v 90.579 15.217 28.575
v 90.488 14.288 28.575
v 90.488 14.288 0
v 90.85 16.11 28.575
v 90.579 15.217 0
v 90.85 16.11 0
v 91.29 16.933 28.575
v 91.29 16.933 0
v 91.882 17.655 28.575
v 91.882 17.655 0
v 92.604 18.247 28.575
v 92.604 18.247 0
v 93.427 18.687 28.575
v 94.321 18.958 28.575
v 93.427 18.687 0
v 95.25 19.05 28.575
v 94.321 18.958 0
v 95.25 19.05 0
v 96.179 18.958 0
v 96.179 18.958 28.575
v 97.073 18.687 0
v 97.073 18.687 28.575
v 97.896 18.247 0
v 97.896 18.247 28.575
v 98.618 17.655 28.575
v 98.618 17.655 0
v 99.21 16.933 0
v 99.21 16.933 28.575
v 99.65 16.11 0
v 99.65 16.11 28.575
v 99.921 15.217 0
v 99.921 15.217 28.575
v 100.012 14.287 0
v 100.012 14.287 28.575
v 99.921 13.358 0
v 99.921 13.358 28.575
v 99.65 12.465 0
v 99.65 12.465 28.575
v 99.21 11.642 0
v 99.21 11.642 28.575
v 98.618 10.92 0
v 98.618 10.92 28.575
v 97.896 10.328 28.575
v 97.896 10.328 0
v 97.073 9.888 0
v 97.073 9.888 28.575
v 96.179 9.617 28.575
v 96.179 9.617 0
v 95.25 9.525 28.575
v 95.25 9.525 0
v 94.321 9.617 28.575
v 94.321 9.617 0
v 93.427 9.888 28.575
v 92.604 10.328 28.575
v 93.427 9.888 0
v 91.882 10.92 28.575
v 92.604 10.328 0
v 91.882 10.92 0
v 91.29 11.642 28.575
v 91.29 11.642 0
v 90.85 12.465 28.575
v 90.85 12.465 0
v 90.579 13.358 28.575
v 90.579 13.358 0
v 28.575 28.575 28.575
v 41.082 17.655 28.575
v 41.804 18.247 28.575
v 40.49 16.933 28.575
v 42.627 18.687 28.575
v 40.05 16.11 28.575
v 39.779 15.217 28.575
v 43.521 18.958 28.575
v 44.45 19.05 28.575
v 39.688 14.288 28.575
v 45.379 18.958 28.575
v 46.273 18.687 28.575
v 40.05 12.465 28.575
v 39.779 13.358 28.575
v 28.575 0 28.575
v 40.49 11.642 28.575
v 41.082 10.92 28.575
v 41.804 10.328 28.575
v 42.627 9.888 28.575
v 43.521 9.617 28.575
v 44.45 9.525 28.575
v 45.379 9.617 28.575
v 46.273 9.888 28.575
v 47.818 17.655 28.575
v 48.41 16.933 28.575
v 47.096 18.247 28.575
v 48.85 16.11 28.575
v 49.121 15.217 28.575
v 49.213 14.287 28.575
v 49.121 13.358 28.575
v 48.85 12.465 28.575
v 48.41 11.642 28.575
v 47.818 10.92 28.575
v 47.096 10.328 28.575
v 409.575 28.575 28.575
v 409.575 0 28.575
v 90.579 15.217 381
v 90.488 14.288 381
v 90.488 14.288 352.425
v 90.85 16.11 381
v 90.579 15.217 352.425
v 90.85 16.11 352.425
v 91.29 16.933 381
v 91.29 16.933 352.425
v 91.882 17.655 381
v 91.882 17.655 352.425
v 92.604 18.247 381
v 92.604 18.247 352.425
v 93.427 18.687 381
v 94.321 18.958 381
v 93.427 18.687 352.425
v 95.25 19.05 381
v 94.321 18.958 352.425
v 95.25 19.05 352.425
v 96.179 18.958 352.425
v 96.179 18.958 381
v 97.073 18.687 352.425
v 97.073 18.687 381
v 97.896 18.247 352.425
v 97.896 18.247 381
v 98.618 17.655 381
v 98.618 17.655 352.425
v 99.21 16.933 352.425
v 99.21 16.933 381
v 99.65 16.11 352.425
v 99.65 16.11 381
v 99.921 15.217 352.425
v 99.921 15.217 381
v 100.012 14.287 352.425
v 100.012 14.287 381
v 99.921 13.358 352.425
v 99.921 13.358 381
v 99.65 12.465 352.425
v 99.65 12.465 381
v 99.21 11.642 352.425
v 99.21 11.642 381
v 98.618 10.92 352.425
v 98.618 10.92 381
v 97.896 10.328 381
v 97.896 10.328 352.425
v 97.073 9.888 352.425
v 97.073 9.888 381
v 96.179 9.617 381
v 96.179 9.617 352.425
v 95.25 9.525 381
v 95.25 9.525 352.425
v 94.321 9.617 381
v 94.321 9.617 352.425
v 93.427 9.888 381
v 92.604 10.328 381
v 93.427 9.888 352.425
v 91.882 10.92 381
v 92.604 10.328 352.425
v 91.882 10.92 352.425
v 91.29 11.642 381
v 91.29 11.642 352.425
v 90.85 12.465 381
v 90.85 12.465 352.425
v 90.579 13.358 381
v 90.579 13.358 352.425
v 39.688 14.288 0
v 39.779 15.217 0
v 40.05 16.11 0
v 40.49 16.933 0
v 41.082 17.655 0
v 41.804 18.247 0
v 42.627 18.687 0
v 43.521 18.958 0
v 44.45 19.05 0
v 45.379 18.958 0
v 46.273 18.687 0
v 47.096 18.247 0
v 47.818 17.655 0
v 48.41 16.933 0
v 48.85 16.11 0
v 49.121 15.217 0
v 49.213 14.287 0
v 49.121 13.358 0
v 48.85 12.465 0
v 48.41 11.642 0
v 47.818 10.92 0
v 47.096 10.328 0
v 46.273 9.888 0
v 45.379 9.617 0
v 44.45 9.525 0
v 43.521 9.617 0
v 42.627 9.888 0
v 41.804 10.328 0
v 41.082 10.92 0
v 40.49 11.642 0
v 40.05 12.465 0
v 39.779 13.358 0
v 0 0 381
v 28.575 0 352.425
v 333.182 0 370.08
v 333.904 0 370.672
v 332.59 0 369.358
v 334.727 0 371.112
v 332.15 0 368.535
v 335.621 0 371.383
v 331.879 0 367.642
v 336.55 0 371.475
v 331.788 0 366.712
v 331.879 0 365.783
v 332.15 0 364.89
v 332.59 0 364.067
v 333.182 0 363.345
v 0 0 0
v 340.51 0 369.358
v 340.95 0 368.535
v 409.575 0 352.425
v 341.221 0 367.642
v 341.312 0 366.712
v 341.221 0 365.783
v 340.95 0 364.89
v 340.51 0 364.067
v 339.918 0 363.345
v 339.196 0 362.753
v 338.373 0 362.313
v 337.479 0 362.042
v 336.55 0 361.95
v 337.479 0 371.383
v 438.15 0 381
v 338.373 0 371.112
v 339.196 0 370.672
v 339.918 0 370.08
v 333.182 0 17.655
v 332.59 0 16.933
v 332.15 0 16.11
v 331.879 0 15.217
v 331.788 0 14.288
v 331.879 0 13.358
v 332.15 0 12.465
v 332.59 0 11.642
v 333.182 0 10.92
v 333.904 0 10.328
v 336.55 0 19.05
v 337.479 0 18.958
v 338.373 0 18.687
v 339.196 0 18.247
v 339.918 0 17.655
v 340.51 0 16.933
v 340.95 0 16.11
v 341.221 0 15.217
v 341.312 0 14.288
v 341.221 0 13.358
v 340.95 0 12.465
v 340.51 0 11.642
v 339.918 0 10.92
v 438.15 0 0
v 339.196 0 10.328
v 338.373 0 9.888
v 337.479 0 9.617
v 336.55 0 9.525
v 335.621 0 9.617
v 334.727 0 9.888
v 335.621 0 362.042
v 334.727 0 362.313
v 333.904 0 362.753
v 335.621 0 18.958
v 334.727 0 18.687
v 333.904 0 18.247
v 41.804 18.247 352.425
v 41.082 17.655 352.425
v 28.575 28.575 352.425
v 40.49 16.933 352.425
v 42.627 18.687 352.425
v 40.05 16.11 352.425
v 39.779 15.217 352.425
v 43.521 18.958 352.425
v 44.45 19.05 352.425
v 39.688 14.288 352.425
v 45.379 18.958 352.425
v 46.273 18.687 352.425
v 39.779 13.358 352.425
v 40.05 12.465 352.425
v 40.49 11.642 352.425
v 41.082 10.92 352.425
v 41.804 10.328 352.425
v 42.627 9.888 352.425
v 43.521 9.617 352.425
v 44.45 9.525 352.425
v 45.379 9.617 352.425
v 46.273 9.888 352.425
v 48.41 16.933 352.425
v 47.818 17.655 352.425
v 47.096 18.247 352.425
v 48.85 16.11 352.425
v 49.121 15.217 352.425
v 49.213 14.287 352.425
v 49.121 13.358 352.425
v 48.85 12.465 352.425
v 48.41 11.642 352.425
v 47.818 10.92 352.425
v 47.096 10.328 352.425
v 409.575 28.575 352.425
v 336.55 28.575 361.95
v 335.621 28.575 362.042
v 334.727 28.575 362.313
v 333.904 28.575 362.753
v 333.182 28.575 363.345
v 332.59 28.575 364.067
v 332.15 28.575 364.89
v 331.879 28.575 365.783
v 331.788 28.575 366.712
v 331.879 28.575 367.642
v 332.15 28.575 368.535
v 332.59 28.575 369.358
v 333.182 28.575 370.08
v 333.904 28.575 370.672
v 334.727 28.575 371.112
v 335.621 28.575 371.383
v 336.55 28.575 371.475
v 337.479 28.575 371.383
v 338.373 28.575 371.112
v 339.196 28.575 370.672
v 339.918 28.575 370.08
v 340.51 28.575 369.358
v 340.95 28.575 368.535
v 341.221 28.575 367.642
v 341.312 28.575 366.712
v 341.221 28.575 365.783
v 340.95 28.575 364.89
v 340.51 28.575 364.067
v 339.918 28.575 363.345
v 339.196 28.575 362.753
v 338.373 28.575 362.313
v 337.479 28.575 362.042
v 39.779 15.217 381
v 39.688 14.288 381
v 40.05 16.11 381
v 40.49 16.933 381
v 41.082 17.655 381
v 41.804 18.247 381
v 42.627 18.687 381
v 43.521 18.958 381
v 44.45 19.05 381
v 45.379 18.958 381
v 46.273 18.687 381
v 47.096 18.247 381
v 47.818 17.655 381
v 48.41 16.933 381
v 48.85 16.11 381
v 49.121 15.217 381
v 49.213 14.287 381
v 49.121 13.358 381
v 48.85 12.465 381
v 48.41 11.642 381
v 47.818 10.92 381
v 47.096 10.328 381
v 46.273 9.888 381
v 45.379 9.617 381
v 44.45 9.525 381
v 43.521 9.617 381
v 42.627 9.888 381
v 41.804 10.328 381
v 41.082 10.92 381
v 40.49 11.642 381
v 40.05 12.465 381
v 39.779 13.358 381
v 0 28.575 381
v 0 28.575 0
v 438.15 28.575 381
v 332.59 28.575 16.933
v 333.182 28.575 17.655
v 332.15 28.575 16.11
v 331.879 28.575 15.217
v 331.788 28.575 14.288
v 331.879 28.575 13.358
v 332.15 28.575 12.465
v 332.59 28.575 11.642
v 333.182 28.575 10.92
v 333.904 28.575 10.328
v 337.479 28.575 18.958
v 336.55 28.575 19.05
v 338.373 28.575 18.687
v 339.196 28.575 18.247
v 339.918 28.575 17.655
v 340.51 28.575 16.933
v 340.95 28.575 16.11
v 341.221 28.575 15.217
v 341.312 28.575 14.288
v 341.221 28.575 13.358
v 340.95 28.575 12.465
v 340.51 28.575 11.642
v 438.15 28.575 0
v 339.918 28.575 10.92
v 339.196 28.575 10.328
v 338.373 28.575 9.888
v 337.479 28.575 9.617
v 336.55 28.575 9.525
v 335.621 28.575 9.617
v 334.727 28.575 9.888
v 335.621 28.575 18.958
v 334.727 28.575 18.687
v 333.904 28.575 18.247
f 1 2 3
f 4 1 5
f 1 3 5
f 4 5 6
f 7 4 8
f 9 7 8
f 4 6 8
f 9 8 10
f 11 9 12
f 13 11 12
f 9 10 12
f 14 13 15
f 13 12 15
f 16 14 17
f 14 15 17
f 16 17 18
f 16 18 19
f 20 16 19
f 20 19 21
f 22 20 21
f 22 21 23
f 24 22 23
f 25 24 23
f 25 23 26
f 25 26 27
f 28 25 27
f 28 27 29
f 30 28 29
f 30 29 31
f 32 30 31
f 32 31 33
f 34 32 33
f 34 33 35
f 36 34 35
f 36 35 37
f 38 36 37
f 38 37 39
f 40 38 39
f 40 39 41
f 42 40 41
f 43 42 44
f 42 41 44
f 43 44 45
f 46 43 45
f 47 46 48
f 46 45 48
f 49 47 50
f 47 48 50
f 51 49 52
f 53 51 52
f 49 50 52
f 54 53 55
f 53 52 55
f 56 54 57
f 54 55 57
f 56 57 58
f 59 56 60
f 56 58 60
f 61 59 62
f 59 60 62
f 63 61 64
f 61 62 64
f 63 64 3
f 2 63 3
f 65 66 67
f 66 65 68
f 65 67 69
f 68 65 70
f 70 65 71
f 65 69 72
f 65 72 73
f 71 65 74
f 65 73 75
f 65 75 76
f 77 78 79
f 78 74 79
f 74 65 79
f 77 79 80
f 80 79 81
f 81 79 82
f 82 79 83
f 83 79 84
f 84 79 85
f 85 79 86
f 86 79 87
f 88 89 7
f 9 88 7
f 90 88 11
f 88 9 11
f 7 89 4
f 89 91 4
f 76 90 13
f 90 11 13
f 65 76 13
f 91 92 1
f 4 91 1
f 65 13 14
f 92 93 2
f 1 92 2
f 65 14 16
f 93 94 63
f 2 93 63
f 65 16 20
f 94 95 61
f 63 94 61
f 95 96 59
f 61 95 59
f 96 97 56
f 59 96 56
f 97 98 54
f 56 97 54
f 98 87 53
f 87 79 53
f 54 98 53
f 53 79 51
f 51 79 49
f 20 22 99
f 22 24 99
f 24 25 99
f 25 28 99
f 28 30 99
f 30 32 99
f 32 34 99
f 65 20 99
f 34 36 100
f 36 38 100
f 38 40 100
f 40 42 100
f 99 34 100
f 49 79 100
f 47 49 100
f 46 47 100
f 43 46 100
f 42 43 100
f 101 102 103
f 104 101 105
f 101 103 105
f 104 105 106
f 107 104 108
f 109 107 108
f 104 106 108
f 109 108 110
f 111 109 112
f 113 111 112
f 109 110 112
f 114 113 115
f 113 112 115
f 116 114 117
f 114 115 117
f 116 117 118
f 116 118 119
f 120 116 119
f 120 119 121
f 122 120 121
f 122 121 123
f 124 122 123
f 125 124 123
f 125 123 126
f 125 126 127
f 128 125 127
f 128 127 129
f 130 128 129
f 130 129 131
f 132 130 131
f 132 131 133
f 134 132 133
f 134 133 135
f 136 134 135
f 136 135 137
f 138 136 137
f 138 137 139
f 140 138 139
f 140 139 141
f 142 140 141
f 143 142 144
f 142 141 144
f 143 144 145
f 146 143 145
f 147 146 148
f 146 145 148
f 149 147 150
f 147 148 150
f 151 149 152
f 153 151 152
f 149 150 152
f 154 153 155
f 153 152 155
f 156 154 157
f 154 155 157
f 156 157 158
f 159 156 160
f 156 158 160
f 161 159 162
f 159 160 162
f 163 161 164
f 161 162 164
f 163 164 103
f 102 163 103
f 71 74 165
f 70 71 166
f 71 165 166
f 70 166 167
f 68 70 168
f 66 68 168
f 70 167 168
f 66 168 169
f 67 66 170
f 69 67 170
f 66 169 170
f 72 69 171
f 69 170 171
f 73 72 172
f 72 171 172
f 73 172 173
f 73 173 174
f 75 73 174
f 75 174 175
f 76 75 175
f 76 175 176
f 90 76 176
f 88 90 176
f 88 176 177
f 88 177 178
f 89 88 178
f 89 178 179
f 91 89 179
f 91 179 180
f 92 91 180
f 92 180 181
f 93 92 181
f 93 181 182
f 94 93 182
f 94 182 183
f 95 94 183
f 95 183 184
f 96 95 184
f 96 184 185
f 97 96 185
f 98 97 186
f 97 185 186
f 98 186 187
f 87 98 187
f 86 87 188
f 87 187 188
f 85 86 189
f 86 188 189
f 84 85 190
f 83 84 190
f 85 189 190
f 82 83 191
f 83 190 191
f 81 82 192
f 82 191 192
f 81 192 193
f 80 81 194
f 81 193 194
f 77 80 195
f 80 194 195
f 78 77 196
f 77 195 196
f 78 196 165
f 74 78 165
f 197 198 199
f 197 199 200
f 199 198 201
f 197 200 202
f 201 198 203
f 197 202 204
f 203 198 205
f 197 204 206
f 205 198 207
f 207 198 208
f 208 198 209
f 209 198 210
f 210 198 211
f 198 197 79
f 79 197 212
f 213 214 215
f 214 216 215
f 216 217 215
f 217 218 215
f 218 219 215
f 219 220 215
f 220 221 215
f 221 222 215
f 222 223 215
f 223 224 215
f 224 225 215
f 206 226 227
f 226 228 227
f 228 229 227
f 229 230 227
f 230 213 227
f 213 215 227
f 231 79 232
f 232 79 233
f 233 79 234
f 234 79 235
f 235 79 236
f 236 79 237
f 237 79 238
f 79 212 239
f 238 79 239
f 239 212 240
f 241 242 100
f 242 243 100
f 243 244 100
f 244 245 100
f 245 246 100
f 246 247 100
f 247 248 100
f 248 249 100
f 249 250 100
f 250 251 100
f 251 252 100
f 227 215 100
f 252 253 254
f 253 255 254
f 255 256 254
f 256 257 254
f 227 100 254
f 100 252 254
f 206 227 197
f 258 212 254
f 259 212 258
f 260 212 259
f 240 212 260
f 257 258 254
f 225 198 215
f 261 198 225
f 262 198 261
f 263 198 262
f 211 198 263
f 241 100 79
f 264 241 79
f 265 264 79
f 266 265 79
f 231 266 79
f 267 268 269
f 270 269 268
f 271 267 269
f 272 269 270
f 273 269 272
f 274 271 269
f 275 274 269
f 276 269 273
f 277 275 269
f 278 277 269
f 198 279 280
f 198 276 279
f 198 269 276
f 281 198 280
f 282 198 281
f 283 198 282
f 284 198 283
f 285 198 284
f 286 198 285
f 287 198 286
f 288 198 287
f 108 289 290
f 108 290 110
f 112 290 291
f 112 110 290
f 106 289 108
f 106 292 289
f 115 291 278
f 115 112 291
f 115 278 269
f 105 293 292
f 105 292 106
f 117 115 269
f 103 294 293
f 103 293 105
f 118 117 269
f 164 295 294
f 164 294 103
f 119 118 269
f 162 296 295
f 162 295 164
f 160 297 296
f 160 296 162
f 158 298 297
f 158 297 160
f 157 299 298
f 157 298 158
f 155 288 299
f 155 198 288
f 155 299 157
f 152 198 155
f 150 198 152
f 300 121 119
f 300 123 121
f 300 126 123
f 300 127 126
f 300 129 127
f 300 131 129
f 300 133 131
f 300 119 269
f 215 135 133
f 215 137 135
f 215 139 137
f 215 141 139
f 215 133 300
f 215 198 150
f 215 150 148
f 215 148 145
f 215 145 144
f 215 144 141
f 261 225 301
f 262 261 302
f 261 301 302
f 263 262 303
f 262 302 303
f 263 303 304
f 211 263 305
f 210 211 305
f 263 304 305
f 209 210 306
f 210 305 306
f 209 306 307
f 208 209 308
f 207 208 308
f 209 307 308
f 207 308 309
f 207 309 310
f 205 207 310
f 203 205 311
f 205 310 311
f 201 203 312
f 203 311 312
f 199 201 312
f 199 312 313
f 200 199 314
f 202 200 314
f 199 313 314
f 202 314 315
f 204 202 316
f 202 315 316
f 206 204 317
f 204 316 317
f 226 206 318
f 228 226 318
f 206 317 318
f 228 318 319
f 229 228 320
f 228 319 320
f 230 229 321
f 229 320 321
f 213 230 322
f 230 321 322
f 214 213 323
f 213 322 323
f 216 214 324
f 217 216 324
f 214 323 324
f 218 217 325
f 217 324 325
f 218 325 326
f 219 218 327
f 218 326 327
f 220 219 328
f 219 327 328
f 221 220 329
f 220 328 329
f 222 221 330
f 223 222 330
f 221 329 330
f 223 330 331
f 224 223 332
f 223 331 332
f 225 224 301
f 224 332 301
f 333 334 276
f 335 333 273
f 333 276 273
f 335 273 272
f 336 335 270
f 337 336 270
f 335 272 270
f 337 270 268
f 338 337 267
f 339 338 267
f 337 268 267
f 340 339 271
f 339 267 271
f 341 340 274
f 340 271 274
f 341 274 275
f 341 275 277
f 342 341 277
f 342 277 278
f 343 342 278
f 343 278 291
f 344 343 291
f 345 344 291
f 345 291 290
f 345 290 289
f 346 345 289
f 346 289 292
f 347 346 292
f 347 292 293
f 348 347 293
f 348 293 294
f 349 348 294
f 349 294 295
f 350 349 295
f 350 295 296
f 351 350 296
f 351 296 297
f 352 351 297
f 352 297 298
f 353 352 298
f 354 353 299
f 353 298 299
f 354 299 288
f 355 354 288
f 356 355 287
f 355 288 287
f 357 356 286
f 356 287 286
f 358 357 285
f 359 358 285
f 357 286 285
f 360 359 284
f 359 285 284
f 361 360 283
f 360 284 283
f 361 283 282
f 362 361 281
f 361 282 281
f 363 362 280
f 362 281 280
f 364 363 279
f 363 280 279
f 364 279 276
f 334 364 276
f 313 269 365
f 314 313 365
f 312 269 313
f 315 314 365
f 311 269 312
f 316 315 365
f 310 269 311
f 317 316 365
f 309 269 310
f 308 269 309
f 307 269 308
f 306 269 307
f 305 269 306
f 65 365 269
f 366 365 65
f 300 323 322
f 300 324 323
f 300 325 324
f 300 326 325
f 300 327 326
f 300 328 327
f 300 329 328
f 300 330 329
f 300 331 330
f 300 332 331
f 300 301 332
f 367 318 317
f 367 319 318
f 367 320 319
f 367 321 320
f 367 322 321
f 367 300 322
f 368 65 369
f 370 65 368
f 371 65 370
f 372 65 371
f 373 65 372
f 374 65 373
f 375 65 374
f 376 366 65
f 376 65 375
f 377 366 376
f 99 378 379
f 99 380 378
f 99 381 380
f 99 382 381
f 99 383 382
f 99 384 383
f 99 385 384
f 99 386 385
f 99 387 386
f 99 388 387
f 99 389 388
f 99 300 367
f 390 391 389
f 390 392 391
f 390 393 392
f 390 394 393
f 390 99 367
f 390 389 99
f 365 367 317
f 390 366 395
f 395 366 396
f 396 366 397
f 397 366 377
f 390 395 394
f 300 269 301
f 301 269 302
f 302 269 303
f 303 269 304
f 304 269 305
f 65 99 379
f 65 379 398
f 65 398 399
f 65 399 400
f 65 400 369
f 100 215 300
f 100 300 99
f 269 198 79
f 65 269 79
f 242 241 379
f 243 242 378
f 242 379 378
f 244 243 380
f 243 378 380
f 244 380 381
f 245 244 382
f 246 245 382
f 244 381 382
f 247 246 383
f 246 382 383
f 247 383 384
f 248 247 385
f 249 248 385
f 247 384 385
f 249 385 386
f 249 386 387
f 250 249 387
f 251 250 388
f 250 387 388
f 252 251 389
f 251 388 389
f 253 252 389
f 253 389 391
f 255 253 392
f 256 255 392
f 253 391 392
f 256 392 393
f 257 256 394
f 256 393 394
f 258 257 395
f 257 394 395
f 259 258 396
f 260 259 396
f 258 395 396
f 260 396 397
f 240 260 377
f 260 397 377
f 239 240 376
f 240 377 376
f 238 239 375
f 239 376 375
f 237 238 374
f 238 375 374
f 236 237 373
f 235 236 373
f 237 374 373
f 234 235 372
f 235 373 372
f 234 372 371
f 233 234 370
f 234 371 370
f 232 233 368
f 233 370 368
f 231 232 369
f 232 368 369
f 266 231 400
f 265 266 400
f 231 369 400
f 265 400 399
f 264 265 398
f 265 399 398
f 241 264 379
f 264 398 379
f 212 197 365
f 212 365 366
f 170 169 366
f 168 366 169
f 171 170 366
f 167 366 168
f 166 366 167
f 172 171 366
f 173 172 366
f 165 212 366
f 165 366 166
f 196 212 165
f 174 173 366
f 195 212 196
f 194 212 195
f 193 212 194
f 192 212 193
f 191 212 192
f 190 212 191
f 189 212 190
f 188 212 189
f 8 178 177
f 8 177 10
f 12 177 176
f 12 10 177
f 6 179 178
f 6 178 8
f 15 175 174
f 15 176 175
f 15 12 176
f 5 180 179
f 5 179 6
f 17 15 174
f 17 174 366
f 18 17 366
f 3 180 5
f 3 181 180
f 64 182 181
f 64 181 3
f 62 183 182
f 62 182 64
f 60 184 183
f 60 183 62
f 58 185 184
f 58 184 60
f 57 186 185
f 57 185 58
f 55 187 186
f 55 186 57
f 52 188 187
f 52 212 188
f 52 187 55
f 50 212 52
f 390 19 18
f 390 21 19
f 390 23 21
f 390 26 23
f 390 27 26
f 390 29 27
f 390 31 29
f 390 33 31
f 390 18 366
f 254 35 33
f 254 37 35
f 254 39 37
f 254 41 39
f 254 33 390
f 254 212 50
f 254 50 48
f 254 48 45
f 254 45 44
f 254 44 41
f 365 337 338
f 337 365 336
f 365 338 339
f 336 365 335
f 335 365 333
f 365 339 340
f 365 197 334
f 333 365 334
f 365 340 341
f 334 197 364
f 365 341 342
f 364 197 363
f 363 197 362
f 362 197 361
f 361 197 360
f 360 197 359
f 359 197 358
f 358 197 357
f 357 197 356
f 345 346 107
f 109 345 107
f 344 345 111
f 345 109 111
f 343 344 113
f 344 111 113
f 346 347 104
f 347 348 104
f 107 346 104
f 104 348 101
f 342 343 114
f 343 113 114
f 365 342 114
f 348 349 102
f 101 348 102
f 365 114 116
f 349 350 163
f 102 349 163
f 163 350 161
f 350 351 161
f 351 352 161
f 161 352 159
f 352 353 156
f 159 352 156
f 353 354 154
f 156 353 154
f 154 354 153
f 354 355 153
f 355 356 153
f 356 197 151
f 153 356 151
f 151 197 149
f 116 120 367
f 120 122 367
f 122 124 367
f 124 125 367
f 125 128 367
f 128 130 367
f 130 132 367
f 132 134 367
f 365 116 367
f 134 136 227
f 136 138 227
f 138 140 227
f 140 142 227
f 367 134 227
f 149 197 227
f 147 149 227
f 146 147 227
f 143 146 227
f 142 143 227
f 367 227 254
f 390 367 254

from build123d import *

# Parameters (mm, degrees)
SKETCH1_W           = 438.15
SKETCH1_H           = 381
SKETCH1_W_2         = 381
SKETCH1_H_2         = 323.85
BOSS_EXTRUDE1_DEPTH = 28.575
SKETCH2_R           = 4.7625
CUT_EXTRUDE1_DEPTH  = 582.337211199
SKETCH3_R           = 4.7625
CUT_EXTRUDE2_DEPTH  = 28.575


with BuildPart() as part:
    # Sketch1 → Boss-Extrude1 (new body)
    with BuildSketch(Plane(origin=(0, 0, 0), x_dir=(1, 0, 0), z_dir=(0, 1, 0))):
        with Locations((219.075, -190.5)):
            Rectangle(SKETCH1_W, SKETCH1_H)
        with Locations((219.075, -190.5)):
            Rectangle(SKETCH1_W_2, SKETCH1_H_2, mode=Mode.SUBTRACT)
    extrude(amount=BOSS_EXTRUDE1_DEPTH)

    # Sketch2 → Cut-Extrude1 (cut, through all)
    with BuildSketch(Plane(origin=(0, 0, 0), x_dir=(-1, 0, 0), z_dir=(0, 0, -1))):
        with Locations((-44.45, 14.2875)):
            Circle(SKETCH2_R)
        with Locations((-95.25, 14.2875)):
            Circle(SKETCH2_R)
    extrude(amount=-CUT_EXTRUDE1_DEPTH, mode=Mode.SUBTRACT)

    # Sketch3 → Cut-Extrude2 (cut)
    with BuildSketch(Plane(origin=(0, 28.575, 0), x_dir=(1, 0, 0), z_dir=(0, 1, 0))):
        with Locations(Location((336.55, -14.2875, 0), (0, 0, 270))):
            Circle(SKETCH3_R)
        with Locations(Location((336.55, -366.7125, 0), (0, 0, 90))):
            Circle(SKETCH3_R)
    extrude(amount=-CUT_EXTRUDE2_DEPTH, mode=Mode.SUBTRACT)


solid = part.part
